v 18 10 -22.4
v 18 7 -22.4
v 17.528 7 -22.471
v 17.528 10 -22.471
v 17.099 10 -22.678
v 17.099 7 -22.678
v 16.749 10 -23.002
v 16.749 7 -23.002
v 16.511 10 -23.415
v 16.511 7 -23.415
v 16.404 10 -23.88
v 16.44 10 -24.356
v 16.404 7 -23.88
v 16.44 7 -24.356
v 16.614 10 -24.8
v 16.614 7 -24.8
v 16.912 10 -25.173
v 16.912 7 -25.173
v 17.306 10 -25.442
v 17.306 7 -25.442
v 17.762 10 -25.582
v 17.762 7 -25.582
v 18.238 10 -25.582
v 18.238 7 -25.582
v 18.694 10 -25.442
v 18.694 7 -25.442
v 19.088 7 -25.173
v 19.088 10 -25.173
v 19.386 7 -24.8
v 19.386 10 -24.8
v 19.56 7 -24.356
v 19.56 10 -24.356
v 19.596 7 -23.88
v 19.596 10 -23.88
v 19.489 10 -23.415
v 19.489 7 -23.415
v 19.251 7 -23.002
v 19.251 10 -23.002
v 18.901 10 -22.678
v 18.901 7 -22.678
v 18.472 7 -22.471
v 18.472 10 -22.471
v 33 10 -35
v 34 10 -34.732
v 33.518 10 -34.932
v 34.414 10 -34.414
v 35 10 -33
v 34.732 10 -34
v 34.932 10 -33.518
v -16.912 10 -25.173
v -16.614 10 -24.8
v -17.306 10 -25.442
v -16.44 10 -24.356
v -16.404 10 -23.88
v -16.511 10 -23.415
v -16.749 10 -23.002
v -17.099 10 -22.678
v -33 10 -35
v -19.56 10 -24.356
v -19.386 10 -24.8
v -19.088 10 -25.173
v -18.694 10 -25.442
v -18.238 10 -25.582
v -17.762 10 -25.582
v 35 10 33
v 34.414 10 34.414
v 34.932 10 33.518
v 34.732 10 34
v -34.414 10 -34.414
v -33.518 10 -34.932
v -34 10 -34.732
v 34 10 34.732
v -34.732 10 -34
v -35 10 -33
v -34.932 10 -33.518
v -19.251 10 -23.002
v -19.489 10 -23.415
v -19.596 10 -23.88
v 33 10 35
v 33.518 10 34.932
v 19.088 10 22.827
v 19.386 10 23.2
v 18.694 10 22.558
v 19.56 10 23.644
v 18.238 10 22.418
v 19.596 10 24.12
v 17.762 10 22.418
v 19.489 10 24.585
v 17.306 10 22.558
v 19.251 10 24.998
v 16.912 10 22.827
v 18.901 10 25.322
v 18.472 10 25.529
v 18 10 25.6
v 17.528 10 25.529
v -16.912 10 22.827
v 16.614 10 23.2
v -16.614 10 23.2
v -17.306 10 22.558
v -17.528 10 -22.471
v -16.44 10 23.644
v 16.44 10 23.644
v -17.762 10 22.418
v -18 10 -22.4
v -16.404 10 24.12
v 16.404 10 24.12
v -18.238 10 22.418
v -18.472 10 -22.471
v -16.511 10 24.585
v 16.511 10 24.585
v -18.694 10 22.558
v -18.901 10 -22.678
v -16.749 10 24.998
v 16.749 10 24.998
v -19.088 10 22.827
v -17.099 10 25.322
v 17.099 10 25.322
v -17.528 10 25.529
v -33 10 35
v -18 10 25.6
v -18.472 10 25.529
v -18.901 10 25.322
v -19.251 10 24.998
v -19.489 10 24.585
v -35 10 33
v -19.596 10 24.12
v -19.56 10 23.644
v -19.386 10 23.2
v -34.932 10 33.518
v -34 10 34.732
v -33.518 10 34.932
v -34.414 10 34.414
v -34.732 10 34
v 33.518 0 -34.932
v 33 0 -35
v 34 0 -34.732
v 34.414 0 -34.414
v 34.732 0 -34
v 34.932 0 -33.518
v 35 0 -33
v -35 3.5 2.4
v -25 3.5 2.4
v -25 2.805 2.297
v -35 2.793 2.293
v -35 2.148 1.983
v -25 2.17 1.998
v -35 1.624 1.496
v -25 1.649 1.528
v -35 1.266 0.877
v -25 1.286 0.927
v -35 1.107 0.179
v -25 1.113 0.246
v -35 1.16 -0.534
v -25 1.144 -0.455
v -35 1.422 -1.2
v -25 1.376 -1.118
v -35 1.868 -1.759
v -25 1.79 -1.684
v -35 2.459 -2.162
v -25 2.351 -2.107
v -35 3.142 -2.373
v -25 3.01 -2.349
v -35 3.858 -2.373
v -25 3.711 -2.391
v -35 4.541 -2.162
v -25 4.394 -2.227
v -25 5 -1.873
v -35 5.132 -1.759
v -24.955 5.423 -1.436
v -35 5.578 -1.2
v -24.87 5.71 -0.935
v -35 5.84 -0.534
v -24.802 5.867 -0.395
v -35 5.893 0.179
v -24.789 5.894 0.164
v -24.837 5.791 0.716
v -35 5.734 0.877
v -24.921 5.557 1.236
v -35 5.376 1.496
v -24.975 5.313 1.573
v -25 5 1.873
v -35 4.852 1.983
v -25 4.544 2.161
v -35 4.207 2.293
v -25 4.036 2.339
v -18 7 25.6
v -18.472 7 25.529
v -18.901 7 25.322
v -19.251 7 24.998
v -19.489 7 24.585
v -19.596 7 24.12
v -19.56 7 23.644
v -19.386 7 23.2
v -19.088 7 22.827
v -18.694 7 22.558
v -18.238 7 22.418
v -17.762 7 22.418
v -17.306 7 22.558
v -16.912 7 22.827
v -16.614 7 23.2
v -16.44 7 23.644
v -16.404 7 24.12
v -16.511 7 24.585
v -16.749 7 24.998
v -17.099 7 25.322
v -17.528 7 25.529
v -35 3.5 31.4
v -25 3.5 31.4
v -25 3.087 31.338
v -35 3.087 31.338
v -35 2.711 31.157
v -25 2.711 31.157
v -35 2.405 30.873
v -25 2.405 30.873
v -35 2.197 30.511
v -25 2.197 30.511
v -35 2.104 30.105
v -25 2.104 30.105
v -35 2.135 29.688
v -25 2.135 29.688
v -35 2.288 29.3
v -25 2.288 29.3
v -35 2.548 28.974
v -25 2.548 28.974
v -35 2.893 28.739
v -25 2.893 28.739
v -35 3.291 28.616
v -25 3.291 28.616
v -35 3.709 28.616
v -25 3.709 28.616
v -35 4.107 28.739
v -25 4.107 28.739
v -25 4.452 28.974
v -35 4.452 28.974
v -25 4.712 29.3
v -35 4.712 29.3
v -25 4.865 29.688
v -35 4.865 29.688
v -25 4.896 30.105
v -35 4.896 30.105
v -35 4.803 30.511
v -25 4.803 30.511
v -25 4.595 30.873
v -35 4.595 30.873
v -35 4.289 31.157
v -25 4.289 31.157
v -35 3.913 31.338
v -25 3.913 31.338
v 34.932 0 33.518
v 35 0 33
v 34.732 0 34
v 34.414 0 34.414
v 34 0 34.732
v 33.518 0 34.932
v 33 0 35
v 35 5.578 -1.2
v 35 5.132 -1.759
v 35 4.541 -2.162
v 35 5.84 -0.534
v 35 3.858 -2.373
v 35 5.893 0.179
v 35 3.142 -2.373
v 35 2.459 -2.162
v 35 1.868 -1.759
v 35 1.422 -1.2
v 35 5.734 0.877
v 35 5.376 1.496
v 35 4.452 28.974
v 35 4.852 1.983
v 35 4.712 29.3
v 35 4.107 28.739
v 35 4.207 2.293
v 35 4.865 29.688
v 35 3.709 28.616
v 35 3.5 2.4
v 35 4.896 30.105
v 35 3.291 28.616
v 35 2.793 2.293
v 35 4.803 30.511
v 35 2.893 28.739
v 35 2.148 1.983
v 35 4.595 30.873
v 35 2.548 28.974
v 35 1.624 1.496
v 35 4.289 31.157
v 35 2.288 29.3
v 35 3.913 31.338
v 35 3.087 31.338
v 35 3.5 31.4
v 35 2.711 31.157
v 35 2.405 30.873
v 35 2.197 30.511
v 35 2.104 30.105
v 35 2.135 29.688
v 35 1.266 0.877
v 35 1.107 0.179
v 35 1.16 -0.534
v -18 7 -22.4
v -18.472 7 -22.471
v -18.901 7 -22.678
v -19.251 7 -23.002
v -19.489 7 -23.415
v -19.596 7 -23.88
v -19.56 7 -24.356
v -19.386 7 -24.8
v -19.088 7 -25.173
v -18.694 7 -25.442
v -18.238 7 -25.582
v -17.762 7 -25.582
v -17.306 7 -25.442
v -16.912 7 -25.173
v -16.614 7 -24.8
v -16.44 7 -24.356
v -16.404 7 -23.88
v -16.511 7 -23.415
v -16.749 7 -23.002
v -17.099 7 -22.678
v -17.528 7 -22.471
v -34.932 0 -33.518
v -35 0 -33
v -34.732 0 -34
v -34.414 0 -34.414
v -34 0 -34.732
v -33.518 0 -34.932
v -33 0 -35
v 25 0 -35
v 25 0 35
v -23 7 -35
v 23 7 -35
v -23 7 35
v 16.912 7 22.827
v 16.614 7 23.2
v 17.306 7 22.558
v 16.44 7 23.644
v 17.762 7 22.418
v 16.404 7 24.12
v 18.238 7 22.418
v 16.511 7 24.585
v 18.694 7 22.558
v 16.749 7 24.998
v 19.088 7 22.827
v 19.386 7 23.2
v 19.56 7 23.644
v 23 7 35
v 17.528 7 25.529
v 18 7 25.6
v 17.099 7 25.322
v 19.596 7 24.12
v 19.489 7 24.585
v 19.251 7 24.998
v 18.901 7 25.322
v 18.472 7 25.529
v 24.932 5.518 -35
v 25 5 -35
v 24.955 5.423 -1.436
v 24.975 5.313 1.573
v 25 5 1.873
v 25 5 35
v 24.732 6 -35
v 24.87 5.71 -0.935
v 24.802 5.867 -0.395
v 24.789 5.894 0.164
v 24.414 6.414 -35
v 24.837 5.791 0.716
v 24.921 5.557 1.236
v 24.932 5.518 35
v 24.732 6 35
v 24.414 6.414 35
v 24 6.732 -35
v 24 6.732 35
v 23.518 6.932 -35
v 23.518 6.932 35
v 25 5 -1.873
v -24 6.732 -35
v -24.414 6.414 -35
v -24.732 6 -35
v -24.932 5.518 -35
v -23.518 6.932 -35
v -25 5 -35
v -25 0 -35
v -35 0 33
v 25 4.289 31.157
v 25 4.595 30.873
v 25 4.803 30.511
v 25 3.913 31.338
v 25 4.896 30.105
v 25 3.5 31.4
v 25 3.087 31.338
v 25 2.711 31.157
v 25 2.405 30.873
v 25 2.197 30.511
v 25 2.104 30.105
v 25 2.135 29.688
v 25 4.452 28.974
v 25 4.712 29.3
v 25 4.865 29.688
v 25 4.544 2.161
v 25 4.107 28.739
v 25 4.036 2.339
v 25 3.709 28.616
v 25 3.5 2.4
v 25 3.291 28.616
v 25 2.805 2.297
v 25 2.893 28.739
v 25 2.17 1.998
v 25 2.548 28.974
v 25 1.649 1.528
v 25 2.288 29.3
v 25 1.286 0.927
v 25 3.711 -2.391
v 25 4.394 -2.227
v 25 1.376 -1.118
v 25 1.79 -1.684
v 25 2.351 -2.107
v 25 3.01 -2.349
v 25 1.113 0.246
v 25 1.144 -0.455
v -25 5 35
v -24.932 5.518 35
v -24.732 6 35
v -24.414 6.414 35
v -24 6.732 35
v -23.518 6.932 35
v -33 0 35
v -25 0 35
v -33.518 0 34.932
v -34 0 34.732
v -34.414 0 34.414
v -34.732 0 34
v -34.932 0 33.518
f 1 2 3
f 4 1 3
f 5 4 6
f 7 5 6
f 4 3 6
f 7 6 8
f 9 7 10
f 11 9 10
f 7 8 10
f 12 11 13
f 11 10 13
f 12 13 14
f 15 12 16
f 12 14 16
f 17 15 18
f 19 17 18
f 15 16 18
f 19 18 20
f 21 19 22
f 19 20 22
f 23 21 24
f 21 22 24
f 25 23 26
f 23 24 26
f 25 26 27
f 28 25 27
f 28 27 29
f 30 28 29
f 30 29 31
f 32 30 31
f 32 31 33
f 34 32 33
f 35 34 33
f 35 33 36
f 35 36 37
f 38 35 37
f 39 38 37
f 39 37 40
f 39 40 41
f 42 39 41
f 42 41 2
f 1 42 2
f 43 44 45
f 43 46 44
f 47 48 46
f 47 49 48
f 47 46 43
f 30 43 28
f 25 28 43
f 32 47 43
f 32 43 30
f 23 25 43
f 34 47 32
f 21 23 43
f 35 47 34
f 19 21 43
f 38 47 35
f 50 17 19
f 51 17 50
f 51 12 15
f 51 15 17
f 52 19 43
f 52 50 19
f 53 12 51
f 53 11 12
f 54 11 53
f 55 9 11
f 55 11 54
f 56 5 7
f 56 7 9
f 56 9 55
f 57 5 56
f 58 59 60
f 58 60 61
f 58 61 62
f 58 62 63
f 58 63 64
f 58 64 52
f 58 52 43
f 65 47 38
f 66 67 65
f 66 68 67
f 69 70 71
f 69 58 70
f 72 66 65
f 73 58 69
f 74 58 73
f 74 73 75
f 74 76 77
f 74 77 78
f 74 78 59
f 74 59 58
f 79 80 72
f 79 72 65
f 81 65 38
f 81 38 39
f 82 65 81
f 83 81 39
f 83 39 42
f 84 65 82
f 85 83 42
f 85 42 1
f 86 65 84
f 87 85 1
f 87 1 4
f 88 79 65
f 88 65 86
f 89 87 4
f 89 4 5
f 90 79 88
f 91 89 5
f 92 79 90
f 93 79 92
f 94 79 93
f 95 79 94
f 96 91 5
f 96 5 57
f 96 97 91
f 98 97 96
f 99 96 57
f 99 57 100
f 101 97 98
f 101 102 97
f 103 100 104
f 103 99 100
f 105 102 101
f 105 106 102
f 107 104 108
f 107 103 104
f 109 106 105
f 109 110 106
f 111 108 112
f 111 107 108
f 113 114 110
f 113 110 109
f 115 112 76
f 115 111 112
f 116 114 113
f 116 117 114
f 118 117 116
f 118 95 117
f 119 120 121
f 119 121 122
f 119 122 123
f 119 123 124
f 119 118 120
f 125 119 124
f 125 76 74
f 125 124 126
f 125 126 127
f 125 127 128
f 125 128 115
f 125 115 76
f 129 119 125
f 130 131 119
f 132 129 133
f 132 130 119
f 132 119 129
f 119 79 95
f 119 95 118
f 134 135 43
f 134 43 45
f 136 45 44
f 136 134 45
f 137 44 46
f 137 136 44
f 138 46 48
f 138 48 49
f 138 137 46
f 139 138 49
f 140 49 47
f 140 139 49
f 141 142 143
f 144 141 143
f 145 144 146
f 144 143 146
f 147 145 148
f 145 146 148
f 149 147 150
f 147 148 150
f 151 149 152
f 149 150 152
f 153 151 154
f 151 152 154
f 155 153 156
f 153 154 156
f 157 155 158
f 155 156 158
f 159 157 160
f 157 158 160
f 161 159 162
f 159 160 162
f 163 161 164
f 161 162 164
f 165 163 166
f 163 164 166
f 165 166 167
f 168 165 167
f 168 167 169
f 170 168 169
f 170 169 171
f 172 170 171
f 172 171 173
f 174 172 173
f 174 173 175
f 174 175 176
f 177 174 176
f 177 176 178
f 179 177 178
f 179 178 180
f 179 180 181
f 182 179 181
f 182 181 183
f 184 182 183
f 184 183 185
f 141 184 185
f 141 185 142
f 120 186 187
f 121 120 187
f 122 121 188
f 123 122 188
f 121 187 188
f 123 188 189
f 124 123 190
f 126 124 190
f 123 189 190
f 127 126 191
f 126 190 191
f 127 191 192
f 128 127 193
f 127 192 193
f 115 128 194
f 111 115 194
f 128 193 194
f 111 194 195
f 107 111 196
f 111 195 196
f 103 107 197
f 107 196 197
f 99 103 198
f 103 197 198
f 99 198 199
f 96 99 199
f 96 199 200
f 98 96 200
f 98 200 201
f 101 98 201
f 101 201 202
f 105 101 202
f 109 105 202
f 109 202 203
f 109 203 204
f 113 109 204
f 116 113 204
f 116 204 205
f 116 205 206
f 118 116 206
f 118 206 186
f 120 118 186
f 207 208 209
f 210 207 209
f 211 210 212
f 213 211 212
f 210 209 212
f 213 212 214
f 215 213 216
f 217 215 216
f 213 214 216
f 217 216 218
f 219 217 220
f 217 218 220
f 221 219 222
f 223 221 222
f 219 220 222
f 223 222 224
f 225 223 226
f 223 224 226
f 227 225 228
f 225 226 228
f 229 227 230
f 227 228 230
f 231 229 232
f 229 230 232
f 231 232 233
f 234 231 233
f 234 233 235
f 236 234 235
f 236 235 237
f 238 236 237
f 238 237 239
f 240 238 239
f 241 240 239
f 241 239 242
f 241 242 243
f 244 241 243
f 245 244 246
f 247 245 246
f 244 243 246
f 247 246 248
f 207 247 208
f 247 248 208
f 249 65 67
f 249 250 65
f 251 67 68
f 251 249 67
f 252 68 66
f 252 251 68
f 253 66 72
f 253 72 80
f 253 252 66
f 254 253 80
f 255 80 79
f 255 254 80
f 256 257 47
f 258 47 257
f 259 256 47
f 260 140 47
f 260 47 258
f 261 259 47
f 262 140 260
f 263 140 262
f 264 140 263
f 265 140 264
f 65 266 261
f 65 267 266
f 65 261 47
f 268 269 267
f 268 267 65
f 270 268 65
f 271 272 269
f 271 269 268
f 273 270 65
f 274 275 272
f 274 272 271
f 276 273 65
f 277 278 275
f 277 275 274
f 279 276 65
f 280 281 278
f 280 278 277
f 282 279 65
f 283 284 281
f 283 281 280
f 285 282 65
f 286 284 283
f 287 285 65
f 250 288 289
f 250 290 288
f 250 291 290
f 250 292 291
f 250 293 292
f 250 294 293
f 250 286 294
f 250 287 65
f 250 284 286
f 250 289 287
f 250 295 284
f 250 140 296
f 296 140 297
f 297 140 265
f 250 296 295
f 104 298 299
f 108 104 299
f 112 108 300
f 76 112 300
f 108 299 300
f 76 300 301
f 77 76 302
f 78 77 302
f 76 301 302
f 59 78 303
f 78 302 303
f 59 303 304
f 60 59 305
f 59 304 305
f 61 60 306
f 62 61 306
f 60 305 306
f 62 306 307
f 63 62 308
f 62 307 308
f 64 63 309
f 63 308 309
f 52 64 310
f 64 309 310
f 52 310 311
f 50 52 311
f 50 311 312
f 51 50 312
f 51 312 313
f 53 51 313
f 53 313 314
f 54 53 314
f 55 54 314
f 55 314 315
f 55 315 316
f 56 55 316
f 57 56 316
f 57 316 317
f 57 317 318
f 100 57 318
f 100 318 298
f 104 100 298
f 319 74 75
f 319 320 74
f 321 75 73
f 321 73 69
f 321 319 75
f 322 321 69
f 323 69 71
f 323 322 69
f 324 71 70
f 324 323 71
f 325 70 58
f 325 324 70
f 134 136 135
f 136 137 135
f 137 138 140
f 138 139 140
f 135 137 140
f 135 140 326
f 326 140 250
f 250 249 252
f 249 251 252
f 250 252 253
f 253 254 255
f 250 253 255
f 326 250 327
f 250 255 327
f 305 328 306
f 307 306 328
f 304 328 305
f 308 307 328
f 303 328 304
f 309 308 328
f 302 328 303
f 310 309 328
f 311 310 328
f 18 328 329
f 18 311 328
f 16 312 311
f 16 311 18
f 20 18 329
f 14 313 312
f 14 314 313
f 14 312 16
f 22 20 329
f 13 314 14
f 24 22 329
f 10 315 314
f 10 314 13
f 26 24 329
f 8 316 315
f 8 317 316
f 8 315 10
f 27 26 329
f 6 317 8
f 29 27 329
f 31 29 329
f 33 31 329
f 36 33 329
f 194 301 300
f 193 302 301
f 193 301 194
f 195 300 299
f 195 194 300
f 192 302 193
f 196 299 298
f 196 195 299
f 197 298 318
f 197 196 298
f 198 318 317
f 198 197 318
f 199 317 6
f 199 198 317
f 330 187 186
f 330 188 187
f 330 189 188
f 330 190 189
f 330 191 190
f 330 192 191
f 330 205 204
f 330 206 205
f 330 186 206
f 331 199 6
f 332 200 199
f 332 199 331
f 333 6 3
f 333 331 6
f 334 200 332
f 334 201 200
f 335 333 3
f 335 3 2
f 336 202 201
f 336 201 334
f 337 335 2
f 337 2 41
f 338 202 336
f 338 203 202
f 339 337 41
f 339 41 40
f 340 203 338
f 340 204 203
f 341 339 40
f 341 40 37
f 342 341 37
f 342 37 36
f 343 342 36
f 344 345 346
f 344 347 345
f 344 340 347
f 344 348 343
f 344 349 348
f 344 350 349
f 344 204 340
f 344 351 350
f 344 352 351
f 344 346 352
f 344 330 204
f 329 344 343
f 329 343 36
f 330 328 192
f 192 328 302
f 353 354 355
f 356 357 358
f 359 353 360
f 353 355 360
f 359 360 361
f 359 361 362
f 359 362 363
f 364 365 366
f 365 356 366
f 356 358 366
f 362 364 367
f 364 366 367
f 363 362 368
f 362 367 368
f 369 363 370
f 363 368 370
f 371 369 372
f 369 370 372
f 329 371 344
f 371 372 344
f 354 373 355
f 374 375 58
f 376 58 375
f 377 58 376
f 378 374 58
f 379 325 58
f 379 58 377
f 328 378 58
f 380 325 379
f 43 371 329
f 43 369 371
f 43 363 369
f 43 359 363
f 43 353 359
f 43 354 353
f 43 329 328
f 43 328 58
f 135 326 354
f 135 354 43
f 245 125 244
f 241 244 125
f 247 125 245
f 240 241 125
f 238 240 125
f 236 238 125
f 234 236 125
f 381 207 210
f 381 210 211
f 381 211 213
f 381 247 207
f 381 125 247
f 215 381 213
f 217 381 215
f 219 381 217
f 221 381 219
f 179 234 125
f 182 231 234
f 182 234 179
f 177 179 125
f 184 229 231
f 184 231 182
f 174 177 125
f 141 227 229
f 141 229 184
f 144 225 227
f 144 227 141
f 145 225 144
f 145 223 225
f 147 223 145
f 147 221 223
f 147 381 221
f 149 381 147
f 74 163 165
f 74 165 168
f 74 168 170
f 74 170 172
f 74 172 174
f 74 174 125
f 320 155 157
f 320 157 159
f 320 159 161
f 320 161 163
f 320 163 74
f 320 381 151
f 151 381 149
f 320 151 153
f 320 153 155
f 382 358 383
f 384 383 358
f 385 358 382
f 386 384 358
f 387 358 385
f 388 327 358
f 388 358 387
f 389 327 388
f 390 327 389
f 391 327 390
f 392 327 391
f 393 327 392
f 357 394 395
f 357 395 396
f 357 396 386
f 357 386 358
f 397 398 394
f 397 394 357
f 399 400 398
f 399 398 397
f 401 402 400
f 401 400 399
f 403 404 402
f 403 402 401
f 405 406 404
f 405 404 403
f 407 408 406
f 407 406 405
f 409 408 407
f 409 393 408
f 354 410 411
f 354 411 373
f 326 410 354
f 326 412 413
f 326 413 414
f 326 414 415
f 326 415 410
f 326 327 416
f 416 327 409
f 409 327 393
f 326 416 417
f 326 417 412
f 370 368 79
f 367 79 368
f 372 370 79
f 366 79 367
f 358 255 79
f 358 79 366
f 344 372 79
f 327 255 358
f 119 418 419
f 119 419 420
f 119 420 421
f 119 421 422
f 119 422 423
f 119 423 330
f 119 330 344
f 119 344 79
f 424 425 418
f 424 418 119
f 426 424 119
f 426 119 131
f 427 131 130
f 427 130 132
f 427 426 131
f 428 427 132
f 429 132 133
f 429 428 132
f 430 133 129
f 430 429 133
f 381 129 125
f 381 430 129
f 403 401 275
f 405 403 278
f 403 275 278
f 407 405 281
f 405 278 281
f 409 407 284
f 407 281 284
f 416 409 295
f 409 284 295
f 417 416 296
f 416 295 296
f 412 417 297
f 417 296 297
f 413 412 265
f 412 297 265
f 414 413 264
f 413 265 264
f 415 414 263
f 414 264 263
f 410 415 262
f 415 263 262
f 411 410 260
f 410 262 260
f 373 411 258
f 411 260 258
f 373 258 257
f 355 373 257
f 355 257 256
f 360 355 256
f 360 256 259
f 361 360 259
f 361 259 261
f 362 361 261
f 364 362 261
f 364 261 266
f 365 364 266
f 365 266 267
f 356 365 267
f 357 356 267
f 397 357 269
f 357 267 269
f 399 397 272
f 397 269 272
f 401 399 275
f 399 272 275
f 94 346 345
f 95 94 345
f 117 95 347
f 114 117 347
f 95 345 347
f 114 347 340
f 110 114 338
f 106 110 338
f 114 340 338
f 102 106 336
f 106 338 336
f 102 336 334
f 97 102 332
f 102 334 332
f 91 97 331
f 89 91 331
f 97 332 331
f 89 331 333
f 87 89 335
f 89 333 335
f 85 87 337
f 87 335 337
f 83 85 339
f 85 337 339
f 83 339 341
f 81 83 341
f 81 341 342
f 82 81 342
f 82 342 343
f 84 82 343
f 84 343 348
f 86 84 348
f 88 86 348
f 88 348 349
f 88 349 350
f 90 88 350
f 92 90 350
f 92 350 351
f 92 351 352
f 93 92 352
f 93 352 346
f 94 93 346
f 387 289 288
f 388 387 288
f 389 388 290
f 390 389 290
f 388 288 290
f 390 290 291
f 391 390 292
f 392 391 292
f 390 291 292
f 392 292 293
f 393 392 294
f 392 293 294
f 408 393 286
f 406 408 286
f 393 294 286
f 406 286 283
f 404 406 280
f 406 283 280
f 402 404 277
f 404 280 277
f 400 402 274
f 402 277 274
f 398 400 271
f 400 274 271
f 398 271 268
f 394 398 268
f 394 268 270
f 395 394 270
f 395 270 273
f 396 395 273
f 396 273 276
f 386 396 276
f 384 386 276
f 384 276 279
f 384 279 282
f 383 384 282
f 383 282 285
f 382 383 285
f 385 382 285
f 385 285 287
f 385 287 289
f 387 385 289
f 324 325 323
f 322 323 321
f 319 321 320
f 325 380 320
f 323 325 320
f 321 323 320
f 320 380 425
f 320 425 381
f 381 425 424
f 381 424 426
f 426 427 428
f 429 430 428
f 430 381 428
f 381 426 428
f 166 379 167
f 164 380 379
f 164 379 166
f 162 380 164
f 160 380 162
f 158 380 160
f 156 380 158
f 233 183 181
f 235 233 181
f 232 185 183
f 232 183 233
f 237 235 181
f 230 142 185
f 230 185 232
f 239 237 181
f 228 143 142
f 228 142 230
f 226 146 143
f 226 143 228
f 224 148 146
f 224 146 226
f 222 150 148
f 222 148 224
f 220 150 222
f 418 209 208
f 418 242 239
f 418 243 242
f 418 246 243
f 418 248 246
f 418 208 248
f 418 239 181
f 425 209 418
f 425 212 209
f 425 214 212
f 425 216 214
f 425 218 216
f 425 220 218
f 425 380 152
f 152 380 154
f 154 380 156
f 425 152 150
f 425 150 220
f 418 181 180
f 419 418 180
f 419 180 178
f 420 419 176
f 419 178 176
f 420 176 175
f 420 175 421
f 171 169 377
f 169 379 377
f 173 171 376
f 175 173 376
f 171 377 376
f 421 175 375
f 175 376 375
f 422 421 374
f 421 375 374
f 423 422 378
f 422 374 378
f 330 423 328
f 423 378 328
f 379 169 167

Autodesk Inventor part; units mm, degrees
ref_plane "YZ Plane" through (0, 0, 0) normal (1, 0, 0) x (0, 1, 0)
ref_plane "XZ Plane" through (0, 0, 0) normal (0, 1, 0) x (-1, 0, 0)
ref_plane "XY Plane" through (0, 0, 0) normal (0, 0, 1) x (1, 0, 0)
sketch "スケッチ1" plane through (0, 0, 0) normal (0, 1, 0) x (-1, 0, 0)
  line L0 (35, -35) -> (-35, -35)
  line L1 (-35, -35) -> (-35, 35)
  line L2 (-35, 35) -> (35, 35)
  line L3 (35, 35) -> (35, -35)
  line L4 (35, -35) -> (-35, 35) construction
  line L5 (-35, -35) -> (35, 35) construction
  point P0 (0, 0)
  dimension "d0" = 70
  dimension "d1" = 70
extrude "押し出し1" add sketch "スケッチ1" along normal blind 10
sketch "スケッチ2" plane through (0, 0, 0) normal (0, -1, 0) x (1, 0, 0)
  line L0 (35, -35) -> (-35, -35) projected
  line L1 (-25, 35) -> (25, 35)
  line L2 (25, 35) -> (25, -35)
  line L3 (25, -35) -> (-25, -35)
  line L4 (-25, -35) -> (-25, 35)
  line L5 (-25, 35) -> (25, -35) construction
  line L6 (25, 35) -> (-25, -35) construction
  point P0 (0, 0)
  dimension "d4" = 50
extrude "押し出し2" cut sketch "スケッチ2" against normal blind 7
sketch "スケッチ3" plane through (-35, 0, -35) normal (-1, 0, 0) x (0, 0, 1)
  line L0 (0, 0) -> (70, 0) projected
  point P0 (35, 0)
  point P1 (35, 3.5)
  point P2 (35, 0)
  dimension "d7" = 3.5
hole "穴1" at (-35, 3.5, 0) direction (1, 0, 0) diameter 4.8 end through all
sketch "スケッチ4" plane through (0, 10, 0) normal (0, 1, 0) x (1, 0, 0)
  line L0 (35, 35) -> (-35, 35) projected
  line L1 (-35, 35) -> (-35, -35) projected
  point P0 (0, 0)
  point P1 (-18, 24)
  point P2 (18, 24)
  point P3 (-18, -24)
  point P4 (18, -24)
  dimension "d15" = 18
  dimension "d16" = 24
  dimension "d17" = 11
  dimension "d18" = 17
  dimension "d21" = 36
  dimension "d24" = 48
hole "穴2" at (-18, 10, -24) at (18, 10, -24) at (-18, 10, 24) at (18, 10, 24) direction (0, -1, 0) diameter 3.2 end through all
sketch "スケッチ5" plane through (-35, 0, -35) normal (-1, 0, 0) x (0, 0, 1)
  line L0 (0, 0) -> (70, 0) projected
  circle A0 centre (35, 3.5) radius 2.4 projected
  point P0 (35, 0)
  point P1 (65, 3.5)
  dimension "d34" = 3.5
  dimension "d35" = 30
hole "穴3" at (-35, 3.5, 30) direction (1, 0, 0) diameter 2.8 end through all
fillet "フィレット1" radius 2 6 edges at (-35, 5, 35) (-35, 5, -35) (35, 5, -35) (35, 5, 35) (25, 7, 0) (-25, 7, 0)
properties part number "MID-360_mountA"
